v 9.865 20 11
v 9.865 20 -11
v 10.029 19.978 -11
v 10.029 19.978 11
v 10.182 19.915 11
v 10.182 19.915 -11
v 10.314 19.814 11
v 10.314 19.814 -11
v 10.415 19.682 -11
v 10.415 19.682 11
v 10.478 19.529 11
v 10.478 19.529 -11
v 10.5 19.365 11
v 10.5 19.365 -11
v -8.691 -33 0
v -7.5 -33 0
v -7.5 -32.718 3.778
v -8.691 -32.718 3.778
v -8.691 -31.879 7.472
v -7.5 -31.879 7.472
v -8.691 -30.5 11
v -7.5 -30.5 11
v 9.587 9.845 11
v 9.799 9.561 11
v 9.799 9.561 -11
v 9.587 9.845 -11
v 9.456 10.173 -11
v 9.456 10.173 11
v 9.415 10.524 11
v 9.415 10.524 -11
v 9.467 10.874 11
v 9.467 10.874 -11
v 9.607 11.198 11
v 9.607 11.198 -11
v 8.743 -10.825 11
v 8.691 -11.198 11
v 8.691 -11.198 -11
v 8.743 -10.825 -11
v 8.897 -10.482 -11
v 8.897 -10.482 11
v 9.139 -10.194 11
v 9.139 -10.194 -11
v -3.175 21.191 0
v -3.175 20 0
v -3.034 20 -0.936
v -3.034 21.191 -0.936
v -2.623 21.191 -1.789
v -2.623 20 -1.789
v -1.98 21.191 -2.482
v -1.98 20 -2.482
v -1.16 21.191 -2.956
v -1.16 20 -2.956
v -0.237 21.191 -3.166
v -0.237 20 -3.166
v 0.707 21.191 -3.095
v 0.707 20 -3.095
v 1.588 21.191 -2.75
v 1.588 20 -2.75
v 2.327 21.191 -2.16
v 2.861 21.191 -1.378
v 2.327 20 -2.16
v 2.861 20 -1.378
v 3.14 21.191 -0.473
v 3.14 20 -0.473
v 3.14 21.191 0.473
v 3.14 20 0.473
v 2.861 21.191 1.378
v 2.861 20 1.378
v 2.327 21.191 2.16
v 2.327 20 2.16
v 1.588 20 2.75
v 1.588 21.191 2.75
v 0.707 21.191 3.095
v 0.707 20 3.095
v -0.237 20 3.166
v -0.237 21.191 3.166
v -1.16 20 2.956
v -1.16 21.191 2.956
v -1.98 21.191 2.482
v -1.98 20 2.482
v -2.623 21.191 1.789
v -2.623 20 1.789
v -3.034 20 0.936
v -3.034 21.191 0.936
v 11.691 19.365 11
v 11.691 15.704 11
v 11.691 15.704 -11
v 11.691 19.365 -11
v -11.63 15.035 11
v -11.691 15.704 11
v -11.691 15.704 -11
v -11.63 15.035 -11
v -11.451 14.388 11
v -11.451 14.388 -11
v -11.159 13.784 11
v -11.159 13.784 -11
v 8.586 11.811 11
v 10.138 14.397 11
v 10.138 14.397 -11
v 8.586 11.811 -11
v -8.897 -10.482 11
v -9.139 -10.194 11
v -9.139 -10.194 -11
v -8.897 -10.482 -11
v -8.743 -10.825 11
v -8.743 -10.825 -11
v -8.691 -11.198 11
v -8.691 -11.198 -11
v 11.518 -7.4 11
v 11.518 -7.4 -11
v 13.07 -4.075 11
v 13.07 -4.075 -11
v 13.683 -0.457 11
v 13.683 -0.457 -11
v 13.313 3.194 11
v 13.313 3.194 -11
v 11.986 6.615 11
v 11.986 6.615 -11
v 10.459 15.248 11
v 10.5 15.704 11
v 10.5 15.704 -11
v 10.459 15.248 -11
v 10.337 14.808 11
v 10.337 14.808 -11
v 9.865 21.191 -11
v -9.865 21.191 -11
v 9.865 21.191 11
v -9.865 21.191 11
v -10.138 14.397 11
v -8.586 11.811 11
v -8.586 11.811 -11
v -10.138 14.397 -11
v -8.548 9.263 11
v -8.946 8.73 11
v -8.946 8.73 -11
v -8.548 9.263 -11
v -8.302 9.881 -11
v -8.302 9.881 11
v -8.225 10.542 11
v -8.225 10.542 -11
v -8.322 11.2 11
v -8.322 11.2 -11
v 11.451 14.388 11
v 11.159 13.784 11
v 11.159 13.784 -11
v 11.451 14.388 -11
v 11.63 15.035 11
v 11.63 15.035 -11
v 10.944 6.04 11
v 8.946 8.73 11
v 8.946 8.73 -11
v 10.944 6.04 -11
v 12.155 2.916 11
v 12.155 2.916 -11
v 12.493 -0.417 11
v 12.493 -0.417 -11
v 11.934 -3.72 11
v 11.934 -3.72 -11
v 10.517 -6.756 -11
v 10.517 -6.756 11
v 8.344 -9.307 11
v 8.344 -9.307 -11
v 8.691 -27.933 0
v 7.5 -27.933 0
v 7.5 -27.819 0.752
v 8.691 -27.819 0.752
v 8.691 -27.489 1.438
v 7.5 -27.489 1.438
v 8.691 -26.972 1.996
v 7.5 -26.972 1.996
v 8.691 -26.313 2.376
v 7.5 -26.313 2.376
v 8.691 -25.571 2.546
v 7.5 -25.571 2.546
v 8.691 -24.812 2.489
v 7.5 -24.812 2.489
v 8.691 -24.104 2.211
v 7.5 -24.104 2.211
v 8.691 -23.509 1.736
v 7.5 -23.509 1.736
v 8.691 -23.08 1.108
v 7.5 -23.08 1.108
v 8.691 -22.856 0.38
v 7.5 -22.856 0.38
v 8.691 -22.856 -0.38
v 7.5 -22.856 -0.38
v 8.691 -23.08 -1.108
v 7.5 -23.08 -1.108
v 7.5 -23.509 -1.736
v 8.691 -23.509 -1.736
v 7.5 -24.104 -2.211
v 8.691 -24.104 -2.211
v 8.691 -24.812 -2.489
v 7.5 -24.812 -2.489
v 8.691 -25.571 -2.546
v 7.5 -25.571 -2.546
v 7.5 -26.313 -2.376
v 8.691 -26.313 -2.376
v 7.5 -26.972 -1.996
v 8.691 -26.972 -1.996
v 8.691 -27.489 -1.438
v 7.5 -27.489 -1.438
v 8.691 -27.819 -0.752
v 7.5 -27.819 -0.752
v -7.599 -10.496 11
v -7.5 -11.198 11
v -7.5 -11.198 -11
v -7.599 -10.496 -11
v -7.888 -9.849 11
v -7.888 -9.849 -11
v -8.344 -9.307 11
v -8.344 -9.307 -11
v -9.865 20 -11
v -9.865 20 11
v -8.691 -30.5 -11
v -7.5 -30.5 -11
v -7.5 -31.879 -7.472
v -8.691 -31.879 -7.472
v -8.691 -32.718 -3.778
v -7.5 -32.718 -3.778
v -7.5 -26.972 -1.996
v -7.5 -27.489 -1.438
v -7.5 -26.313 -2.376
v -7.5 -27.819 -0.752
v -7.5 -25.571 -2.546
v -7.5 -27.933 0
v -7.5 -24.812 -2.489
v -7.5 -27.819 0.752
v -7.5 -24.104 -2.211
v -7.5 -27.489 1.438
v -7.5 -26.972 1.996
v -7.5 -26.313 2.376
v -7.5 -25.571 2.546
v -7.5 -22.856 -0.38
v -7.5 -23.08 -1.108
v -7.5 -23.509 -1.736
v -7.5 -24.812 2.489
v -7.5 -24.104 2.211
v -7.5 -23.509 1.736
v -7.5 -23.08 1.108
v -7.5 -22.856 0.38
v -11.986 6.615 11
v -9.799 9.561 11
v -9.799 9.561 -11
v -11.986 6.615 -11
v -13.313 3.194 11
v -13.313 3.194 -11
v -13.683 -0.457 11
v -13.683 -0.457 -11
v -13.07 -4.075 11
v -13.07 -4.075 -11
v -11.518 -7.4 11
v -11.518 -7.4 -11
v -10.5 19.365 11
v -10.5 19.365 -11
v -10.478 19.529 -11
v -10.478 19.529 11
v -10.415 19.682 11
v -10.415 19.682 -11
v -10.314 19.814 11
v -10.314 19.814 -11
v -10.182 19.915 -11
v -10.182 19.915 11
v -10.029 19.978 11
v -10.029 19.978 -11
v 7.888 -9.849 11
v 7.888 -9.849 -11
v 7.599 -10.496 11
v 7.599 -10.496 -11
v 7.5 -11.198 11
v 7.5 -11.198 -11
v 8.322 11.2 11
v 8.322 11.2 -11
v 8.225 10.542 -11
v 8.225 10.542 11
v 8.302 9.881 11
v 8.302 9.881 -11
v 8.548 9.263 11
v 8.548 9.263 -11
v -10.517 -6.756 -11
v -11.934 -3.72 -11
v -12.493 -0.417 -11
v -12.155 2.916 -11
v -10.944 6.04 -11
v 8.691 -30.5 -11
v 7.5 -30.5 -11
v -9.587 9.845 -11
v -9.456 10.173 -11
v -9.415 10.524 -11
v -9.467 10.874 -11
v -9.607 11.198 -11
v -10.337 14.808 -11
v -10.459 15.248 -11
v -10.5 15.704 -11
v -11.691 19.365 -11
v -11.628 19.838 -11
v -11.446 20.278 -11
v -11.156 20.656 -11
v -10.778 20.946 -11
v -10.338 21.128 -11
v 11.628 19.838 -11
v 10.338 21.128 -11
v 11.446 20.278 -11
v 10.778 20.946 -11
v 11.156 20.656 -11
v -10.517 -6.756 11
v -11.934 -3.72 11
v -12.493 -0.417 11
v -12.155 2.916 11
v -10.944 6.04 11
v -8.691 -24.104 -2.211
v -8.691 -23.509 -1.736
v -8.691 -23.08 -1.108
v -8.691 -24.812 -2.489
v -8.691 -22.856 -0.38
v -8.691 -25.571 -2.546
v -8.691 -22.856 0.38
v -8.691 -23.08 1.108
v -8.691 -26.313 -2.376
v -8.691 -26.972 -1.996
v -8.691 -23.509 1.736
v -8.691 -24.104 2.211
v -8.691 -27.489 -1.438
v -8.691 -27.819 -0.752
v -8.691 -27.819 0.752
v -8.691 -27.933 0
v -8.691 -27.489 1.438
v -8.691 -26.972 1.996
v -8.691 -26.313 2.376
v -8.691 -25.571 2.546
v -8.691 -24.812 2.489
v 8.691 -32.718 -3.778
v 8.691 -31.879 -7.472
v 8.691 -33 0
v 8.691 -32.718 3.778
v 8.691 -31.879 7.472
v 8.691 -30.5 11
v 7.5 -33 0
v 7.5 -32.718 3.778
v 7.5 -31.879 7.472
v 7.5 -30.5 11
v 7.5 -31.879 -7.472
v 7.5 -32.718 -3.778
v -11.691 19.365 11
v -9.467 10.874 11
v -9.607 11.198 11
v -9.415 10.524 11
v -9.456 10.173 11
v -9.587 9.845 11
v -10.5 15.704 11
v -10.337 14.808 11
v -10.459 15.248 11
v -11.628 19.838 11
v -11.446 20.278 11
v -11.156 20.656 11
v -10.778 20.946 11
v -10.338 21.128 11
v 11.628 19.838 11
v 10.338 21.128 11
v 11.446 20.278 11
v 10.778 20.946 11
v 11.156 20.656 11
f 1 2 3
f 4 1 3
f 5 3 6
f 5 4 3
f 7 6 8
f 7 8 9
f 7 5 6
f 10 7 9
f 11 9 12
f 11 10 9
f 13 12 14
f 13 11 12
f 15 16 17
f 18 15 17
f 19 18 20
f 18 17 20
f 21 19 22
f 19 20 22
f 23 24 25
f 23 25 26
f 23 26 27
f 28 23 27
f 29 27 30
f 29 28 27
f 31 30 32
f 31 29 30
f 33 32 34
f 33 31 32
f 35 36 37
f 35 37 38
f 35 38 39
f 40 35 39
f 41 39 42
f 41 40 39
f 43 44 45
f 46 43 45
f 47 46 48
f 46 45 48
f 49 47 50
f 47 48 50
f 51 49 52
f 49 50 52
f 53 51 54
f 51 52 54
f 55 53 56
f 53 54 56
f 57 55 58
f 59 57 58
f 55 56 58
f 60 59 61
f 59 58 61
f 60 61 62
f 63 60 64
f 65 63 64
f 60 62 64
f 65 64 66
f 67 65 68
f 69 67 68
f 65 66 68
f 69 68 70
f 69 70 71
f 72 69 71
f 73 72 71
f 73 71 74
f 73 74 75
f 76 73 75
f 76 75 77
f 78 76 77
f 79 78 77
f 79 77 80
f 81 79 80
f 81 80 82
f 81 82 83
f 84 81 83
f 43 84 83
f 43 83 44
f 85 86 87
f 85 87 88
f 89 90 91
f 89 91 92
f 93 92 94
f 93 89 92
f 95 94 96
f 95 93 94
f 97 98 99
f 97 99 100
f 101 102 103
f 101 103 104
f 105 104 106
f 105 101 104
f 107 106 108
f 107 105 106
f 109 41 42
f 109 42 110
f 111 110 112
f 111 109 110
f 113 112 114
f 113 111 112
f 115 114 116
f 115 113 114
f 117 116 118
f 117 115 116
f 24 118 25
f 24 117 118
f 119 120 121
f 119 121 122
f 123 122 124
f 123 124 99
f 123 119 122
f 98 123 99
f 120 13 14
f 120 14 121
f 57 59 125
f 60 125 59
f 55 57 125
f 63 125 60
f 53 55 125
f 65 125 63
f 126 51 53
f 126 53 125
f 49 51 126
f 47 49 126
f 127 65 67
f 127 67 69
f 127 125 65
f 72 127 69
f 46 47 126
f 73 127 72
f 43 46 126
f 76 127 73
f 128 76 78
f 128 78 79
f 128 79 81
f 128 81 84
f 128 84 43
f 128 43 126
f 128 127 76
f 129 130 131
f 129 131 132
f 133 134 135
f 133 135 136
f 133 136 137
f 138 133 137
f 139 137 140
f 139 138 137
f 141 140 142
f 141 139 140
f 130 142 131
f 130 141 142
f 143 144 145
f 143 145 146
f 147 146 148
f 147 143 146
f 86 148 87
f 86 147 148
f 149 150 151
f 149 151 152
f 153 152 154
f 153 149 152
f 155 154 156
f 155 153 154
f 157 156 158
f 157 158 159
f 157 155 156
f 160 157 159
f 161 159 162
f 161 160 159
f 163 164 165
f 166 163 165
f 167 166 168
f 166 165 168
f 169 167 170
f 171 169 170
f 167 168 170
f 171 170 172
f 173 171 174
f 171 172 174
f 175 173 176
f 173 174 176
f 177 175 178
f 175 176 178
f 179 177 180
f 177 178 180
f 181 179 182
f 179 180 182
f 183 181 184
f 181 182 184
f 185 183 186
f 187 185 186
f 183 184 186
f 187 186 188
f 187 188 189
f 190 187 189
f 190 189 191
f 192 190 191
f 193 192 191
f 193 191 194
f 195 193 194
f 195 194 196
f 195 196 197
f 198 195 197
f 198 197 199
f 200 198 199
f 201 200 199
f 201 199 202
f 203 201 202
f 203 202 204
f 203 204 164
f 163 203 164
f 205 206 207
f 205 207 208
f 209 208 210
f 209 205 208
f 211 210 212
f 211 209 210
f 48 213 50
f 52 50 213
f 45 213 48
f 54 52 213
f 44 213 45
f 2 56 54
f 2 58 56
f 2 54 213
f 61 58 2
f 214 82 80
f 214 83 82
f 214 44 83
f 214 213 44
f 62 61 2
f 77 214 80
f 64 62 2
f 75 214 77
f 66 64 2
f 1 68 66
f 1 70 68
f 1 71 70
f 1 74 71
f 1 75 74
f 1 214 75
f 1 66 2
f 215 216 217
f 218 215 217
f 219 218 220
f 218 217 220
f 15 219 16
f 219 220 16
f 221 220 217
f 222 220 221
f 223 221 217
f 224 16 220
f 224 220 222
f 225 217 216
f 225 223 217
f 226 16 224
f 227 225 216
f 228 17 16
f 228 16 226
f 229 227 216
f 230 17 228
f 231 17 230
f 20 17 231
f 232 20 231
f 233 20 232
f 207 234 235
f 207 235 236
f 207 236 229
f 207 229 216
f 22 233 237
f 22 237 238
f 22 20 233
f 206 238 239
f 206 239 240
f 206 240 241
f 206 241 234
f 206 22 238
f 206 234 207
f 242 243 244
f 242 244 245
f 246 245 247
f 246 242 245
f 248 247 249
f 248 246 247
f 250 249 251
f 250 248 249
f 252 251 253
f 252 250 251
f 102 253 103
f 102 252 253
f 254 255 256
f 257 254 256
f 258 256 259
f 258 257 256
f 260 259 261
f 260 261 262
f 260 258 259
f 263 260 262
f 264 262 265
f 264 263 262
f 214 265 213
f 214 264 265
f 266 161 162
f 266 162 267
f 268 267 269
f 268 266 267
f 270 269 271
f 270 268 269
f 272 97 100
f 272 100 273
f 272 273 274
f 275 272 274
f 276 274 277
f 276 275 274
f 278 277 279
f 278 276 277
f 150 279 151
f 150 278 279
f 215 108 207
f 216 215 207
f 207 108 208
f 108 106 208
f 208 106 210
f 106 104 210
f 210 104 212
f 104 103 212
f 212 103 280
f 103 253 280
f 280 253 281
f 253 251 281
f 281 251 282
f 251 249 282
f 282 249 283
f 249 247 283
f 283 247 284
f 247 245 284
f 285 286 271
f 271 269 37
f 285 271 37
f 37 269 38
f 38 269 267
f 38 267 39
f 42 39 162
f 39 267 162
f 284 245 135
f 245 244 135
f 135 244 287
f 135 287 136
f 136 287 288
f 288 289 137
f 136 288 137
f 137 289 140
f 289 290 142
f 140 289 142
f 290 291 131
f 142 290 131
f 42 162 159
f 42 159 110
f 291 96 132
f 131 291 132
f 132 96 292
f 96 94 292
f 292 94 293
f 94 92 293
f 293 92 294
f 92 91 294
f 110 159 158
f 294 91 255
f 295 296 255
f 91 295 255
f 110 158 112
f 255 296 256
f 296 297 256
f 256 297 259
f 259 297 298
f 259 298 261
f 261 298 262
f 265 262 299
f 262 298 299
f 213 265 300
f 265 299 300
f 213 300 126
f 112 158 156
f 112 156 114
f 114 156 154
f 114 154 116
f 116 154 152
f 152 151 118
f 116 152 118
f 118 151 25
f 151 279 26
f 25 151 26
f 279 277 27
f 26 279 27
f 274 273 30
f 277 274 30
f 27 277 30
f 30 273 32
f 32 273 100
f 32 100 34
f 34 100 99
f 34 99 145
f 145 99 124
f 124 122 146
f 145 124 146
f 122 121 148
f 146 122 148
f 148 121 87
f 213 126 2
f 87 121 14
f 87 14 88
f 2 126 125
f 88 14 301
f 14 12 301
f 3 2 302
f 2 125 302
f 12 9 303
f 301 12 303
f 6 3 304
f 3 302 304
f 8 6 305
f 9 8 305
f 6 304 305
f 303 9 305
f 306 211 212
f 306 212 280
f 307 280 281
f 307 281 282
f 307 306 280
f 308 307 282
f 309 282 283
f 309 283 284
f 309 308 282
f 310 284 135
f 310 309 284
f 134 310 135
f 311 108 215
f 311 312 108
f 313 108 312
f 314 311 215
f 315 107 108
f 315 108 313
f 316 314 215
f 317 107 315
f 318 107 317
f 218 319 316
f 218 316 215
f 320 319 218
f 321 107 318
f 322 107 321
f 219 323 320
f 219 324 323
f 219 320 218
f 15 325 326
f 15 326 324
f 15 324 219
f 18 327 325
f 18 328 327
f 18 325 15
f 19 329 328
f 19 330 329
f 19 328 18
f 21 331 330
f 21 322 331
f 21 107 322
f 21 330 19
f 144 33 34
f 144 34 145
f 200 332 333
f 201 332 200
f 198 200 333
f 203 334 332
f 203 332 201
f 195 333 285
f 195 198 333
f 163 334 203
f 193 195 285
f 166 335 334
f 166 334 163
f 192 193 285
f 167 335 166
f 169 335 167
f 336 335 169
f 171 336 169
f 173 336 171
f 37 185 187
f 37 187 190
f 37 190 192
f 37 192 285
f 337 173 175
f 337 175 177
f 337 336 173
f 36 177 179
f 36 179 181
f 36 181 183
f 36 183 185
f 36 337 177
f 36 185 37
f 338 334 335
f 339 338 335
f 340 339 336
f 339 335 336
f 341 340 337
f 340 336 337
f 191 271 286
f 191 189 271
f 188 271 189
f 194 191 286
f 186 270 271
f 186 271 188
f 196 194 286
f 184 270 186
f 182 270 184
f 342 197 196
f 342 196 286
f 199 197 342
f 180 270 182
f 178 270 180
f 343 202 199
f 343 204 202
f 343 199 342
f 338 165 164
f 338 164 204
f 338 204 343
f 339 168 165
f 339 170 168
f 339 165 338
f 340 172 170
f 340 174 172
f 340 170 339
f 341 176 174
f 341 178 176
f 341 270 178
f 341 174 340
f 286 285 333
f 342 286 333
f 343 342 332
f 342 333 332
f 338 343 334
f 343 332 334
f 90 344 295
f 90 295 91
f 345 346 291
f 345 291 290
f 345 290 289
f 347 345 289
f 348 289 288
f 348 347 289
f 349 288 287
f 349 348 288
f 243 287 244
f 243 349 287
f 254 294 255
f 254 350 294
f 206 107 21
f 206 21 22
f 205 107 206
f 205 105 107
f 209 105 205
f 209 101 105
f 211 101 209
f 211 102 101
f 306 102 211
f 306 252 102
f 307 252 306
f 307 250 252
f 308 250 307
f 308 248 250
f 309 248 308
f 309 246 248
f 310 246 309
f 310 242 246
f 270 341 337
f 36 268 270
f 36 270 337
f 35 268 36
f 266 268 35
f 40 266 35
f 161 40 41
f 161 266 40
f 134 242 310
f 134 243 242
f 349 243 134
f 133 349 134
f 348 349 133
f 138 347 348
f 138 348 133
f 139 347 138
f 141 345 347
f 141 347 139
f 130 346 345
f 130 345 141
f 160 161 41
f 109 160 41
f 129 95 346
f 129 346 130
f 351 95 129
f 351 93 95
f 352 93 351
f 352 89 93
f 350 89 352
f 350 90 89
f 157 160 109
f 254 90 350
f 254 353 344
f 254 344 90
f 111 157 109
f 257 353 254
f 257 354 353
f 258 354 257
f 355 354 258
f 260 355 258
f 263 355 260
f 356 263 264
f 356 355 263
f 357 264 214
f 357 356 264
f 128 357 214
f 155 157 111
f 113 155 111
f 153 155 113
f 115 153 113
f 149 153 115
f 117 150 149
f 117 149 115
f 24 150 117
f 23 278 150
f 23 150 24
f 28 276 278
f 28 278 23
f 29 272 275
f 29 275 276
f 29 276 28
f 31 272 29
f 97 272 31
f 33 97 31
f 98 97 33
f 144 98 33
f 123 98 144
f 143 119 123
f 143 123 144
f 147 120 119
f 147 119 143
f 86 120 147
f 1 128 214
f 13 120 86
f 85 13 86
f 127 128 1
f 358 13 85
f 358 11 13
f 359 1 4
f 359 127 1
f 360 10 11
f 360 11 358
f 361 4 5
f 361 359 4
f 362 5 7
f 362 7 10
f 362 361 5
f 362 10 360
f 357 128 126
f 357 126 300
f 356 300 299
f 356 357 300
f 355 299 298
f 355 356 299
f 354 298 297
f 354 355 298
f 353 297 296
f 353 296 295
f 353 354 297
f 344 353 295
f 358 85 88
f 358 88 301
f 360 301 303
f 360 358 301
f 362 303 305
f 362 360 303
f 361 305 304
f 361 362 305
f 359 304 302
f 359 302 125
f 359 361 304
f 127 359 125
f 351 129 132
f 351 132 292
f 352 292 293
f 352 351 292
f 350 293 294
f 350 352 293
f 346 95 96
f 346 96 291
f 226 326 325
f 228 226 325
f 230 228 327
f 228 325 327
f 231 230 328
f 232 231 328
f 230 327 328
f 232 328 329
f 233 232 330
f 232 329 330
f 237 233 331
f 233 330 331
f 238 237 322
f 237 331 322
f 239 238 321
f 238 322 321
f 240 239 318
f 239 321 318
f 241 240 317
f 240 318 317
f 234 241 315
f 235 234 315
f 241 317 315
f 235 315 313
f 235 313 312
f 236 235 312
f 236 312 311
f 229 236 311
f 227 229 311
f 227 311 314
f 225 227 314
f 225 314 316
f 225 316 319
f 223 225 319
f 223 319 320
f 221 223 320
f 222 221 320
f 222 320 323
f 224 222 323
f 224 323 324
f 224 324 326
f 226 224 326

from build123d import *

# Parameters (mm, degrees)
BOSS_EXTRUDE2_DEPTH         = 10.999999971
F_1_4_0_25_DIAMETER_HOLE1_D = 6.35
CUT_EXTRUDE1_DEPTH          = 42.363272981
F_1_4_20_TAPPED_HOLE1_D     = 5.1054


with BuildPart() as part:
    # Sketch2 → Boss-Extrude2 (new, symmetric)
    with BuildSketch(Plane.XY):
        with BuildLine():
            Line((-9.864999955, 19.999999846), (9.864999955, 19.999999846))
            ThreePointArc((9.864999955, 19.999999846), (10.314012761, 19.814012652), (10.499999955, 19.364999846))
            Line((10.499999955, 19.364999846), (10.499999955, 15.703539216))
            ThreePointArc((10.499999955, 15.703539216), (10.407835871, 15.025527914), (10.138031981, 14.396719989))
            Line((10.138031981, 14.396719989), (8.586360945, 11.810601618))
            ThreePointArc((8.586360945, 11.810601618), (8.241569778, 10.208887267), (8.946470225, 8.729872335))
            ThreePointArc((8.946470225, 8.729872335), (12.493042308, -0.417006435), (8.344414884, -9.307026416))
            ThreePointArc((8.344414884, -9.307026416), (7.720691236, -10.162643363), (7.499999986, -11.198214181))
            Line((7.499999986, -11.198214181), (7.499999986, -33.000000008))
            Line((7.499999986, -33.000000008), (8.690624986, -33.000000008))
            Line((8.690624986, -33.000000008), (8.690624986, -11.198214181))
            ThreePointArc((8.690624986, -11.198214181), (8.807867212, -10.648067184), (9.139220401, -10.193520681))
            ThreePointArc((9.139220401, -10.193520681), (13.683004586, -0.456726298), (9.798621513, 9.561392674))
            ThreePointArc((9.798621513, 9.561392674), (9.42414315, 10.347119357), (9.607313458, 11.198030105))
            Line((9.607313458, 11.198030105), (11.158984494, 13.784148477))
            ThreePointArc((11.158984494, 13.784148477), (11.555258957, 14.707710116), (11.690624955, 15.703539216))
            Line((11.690624955, 15.703539216), (11.690624955, 19.364999846))
            ThreePointArc((11.690624955, 19.364999846), (11.155911772, 20.655911664), (9.864999955, 21.190624846))
            Line((9.864999955, 21.190624846), (-9.864999955, 21.190624846))
            ThreePointArc((-9.864999955, 21.190624846), (-11.155911772, 20.655911664), (-11.690624955, 19.364999846))
            Line((-11.690624955, 19.364999846), (-11.690624955, 15.703539216))
            ThreePointArc((-11.690624955, 15.703539216), (-11.555258957, 14.707710116), (-11.158984494, 13.784148477))
            Line((-11.158984494, 13.784148477), (-9.607313458, 11.198030105))
            ThreePointArc((-9.607313458, 11.198030105), (-9.42414315, 10.347119357), (-9.798621513, 9.561392674))
            ThreePointArc((-9.798621513, 9.561392674), (-13.683004586, -0.456726298), (-9.139220401, -10.193520681))
            ThreePointArc((-9.139220401, -10.193520681), (-8.807867212, -10.648067184), (-8.690624986, -11.198214181))
            Line((-8.690624986, -11.198214181), (-8.690624986, -33.000000008))
            Line((-8.690624986, -33.000000008), (-7.499999986, -33.000000008))
            Line((-7.499999986, -33.000000008), (-7.499999986, -11.198214181))
            ThreePointArc((-7.499999986, -11.198214181), (-7.720691236, -10.162643363), (-8.344414884, -9.307026416))
            ThreePointArc((-8.344414884, -9.307026416), (-12.493042308, -0.417006435), (-8.946470225, 8.729872335))
            ThreePointArc((-8.946470225, 8.729872335), (-8.241569778, 10.208887267), (-8.586360945, 11.810601618))
            Line((-8.586360945, 11.810601618), (-10.138031981, 14.396719989))
            ThreePointArc((-10.138031981, 14.396719989), (-10.407835871, 15.025527914), (-10.499999955, 15.703539216))
            Line((-10.499999955, 15.703539216), (-10.499999955, 19.364999846))
            ThreePointArc((-10.499999955, 19.364999846), (-10.314012761, 19.814012652), (-9.864999955, 19.999999846))
        make_face()
    extrude(amount=BOSS_EXTRUDE2_DEPTH, both=True)

    # 1/4 (0.25) Diameter Hole1 (through all)
    with Locations(Plane(origin=(0, 21.190624846, 0), x_dir=(1, 0, 0), z_dir=(0, 1, 0))):
        with Locations((0, 0)):
            Hole(F_1_4_0_25_DIAMETER_HOLE1_D / 2)

    # Sketch6 → Cut-Extrude1 (cut, through all)
    with BuildSketch(Plane(origin=(8.690624986, 0, 0), x_dir=(0, 0, -1), z_dir=(1, 0, 0))):
        with BuildLine():
            Line((-10.999999971, -33.000000008), (0, -33.000000008))
            ThreePointArc((0, -33.000000008), (-5.640257081, -32.367131167), (-10.999999971, -30.499999928))
            Line((-10.999999971, -30.499999928), (-10.999999971, -33.000000008))
        make_face()
        with BuildLine():
            Line((0, -33.000000008), (10.999999971, -33.000000008))
            Line((10.999999971, -33.000000008), (10.999999971, -30.499999928))
            ThreePointArc((10.999999971, -30.499999928), (5.640257081, -32.367131167), (0, -33.000000008))
        make_face()
    extrude(amount=-CUT_EXTRUDE1_DEPTH, mode=Mode.SUBTRACT)

    # 1/4-20 Tapped Hole1 (through all)
    with Locations(Plane(origin=(8.690624986, -25.380000008, 0), x_dir=(0, 1, 0), z_dir=(1, 0, 0))):
        with Locations((0, 0)):
            Hole(F_1_4_20_TAPPED_HOLE1_D / 2)


solid = part.part
